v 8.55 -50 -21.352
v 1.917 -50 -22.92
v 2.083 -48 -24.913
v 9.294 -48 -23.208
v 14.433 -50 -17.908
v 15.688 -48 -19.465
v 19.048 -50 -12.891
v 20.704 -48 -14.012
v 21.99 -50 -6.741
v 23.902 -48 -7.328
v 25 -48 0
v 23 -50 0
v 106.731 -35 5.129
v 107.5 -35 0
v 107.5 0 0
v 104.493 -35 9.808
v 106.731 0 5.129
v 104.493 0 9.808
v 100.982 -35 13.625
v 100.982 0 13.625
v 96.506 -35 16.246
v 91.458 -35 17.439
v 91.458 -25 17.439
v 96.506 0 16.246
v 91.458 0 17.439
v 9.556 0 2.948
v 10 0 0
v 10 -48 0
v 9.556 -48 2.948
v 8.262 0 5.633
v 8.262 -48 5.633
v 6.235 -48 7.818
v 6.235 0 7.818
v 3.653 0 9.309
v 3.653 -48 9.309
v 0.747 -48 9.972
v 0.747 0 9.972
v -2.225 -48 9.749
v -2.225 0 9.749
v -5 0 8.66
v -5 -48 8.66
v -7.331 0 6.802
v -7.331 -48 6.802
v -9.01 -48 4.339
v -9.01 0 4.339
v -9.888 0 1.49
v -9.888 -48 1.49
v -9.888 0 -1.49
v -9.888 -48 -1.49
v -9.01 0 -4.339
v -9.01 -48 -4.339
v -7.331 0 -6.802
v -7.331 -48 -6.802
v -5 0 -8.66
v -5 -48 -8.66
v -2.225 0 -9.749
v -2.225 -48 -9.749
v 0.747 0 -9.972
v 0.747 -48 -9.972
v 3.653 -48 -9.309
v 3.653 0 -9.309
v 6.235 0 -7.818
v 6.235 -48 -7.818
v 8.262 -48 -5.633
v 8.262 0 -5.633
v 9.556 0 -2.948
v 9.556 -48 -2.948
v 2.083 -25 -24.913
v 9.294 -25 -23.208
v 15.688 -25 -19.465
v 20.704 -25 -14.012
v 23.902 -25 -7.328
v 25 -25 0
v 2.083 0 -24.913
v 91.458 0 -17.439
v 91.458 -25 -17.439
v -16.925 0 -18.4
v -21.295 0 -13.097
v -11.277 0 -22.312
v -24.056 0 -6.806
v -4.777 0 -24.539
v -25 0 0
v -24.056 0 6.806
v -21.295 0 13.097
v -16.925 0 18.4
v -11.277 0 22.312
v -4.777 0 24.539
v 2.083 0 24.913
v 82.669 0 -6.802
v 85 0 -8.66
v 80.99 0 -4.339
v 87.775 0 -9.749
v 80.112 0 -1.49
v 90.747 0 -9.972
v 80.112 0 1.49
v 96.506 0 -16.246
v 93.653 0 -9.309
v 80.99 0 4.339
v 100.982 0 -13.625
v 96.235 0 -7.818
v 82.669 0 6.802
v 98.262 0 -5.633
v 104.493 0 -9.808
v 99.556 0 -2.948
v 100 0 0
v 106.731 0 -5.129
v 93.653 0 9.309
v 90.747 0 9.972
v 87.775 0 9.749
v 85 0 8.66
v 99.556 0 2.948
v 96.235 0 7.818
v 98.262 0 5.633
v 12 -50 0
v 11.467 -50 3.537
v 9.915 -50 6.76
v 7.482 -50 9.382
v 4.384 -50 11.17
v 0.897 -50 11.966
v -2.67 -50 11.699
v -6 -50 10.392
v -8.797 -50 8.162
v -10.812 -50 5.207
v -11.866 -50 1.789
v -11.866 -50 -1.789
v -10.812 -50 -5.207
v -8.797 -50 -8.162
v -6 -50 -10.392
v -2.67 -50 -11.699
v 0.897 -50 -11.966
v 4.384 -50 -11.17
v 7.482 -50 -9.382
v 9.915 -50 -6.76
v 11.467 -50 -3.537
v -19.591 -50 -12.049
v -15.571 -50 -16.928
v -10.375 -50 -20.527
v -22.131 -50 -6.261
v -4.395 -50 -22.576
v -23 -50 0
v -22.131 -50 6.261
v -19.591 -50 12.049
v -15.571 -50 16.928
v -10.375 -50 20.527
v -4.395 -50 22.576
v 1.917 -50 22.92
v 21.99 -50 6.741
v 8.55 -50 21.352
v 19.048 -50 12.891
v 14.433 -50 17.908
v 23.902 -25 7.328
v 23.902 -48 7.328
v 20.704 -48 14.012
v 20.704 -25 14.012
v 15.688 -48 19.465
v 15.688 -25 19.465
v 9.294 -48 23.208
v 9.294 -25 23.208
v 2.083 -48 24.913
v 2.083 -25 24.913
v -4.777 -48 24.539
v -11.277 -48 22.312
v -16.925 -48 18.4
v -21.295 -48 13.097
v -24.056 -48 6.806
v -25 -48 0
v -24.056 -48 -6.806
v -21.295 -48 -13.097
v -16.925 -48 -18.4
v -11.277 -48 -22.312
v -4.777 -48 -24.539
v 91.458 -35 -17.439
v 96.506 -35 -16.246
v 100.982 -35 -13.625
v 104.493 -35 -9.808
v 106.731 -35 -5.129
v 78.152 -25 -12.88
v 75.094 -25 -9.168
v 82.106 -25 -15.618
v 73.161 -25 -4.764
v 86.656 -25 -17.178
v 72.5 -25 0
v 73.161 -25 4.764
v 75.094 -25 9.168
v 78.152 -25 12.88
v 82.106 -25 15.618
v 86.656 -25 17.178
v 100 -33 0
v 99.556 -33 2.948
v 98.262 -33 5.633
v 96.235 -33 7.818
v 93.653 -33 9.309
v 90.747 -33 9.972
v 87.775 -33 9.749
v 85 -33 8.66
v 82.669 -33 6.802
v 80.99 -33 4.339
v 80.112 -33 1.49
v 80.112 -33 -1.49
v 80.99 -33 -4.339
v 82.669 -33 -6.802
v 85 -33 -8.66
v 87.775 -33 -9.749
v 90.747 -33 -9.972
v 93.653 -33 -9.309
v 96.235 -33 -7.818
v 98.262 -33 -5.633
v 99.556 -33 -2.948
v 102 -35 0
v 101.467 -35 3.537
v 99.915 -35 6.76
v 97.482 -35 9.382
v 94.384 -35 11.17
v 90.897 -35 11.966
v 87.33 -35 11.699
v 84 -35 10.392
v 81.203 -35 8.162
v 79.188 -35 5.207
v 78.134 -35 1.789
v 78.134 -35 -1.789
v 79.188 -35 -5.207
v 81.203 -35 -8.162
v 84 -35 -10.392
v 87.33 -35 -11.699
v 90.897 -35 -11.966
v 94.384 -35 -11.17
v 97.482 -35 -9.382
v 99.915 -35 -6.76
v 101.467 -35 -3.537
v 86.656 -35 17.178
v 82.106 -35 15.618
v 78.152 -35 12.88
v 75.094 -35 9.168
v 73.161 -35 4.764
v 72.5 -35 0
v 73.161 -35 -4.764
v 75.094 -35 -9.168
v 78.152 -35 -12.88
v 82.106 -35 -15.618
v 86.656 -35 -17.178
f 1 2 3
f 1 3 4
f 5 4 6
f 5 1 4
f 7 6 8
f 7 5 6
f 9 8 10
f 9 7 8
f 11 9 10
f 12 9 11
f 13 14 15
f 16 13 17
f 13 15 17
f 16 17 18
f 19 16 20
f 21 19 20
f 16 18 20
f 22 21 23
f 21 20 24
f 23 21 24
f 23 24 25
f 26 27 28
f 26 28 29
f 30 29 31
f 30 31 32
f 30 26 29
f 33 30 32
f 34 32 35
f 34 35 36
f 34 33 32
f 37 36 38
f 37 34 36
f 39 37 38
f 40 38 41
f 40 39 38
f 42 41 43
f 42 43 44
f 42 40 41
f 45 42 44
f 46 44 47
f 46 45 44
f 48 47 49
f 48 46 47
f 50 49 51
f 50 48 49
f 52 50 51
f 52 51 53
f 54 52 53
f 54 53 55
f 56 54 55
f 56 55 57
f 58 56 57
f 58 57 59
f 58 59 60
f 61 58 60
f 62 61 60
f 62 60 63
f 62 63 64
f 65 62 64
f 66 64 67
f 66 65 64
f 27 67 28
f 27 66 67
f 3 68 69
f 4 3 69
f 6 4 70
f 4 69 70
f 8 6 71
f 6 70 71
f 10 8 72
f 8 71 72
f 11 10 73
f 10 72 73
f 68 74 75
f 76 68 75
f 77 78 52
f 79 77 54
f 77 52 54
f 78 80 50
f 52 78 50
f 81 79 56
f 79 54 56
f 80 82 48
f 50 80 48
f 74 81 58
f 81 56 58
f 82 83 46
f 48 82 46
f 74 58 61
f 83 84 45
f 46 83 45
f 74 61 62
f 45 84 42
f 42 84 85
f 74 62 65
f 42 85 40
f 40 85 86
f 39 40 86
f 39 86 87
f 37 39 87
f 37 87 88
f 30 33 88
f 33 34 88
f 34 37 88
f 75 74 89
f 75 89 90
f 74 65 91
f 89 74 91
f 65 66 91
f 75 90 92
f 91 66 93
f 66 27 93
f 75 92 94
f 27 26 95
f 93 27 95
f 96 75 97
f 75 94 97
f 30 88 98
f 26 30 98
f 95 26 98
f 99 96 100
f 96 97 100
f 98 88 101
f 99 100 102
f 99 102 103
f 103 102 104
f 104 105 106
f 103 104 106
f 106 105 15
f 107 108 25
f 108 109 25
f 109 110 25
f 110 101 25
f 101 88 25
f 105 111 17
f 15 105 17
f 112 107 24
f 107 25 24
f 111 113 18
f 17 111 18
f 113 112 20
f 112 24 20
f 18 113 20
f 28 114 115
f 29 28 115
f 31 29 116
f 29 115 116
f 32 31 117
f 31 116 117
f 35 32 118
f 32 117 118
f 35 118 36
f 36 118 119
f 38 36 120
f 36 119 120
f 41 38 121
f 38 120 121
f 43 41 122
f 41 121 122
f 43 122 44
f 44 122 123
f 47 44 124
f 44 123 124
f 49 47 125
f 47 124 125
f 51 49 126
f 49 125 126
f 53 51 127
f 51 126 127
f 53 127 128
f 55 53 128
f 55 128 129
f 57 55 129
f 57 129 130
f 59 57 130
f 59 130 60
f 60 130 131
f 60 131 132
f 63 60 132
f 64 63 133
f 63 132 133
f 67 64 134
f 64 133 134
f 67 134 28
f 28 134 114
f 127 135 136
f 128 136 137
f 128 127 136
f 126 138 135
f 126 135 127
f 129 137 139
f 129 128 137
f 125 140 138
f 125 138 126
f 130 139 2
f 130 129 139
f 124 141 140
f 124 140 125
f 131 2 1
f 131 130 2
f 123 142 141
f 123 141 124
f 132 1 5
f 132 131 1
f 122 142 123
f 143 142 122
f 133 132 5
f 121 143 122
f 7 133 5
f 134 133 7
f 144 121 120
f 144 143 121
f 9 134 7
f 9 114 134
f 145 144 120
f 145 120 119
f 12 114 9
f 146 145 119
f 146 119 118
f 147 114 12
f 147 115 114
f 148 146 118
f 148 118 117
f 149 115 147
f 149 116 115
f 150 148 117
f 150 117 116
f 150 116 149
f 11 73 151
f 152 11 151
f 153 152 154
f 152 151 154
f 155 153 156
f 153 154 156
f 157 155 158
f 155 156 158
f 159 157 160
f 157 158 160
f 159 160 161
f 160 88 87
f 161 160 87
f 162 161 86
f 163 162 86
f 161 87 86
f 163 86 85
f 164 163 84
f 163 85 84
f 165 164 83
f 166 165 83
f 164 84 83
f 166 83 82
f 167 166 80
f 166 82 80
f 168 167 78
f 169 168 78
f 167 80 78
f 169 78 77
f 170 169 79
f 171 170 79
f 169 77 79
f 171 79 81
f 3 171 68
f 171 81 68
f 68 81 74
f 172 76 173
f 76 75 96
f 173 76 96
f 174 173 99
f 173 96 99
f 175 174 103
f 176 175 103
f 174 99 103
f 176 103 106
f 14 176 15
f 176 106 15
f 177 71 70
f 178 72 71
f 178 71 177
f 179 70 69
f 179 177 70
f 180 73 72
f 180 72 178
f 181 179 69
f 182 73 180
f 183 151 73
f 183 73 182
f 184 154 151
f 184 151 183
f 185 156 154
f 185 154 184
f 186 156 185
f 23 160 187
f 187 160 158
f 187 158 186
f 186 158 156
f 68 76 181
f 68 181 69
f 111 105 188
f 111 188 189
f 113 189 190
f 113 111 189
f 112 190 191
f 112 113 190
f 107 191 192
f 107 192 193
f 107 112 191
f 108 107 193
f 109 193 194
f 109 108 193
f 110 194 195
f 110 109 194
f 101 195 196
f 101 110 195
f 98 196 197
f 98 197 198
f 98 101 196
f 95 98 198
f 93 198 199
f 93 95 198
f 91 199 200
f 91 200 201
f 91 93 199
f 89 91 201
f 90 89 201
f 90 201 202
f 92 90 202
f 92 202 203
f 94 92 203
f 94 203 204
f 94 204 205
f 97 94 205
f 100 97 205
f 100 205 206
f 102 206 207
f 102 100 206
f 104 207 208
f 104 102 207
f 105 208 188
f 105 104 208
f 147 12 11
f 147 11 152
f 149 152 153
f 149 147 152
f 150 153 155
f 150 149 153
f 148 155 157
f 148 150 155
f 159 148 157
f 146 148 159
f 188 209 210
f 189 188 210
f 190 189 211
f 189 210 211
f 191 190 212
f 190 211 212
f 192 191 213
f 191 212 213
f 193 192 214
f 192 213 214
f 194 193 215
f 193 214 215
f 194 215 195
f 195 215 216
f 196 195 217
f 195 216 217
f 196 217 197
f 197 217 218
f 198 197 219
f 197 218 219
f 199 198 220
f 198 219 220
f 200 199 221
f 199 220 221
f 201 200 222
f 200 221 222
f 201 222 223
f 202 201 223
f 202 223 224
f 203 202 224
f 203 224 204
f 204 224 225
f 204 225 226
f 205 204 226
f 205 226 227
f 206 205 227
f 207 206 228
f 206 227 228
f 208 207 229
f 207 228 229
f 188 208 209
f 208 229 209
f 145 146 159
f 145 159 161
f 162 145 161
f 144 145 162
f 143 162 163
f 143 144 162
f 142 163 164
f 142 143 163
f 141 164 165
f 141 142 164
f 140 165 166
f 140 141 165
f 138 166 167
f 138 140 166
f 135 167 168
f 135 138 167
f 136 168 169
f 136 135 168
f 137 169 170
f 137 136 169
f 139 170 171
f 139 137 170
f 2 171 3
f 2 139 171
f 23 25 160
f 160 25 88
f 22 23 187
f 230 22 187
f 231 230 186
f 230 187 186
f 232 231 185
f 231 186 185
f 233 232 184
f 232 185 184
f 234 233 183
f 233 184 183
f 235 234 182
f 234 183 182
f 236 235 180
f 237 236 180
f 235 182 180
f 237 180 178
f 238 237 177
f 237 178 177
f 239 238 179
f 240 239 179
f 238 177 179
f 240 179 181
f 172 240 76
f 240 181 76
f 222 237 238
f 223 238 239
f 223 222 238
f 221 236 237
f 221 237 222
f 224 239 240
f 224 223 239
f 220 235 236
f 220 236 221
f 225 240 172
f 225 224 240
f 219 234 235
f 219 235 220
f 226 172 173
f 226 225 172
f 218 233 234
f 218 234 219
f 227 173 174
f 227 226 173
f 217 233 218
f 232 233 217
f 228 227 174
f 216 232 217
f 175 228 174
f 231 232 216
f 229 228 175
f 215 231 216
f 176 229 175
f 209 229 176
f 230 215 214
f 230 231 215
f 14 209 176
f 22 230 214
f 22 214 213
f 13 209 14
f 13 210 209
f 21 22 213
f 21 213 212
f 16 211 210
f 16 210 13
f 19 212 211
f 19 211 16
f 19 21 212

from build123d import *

# Parameters (mm, degrees)
F0_R     = 10
F1_DEPTH = 25
F2_DEPTH = 50
F3_SIZE  = 2
F4_DEPTH = 35
F5_SIZE  = 2


with BuildPart() as f1:
    # F0 (on Front) → F1 (new body)
    with BuildSketch(Plane.XZ):
        with BuildLine():
            ThreePointArc((2.083333, -24.913043), (18.399502, -16.92508), (25, 0))
            ThreePointArc((25, 0), (18.399502, 16.92508), (2.083333, 24.913043))
            ThreePointArc((2.083333, 24.913043), (-25, 0), (2.083333, -24.913043))
        make_face()
        Circle(F0_R, mode=Mode.SUBTRACT)
        with BuildLine():
            ThreePointArc((2.083333, 24.913043), (18.399502, 16.92508), (25, 0))
            ThreePointArc((25, 0), (18.399502, -16.92508), (2.083333, -24.913043))
            Line((2.083333, -24.913043), (91.458333, -17.43913))
            ThreePointArc((91.458333, -17.43913), (72.5, 0), (91.458333, 17.43913))
            Line((91.458333, 17.43913), (2.083333, 24.913043))
        make_face()
        with BuildLine():
            ThreePointArc((107.5, 0), (102.879651, 11.847556), (91.458333, 17.43913))
            ThreePointArc((91.458333, 17.43913), (72.5, 0), (91.458333, -17.43913))
            ThreePointArc((91.458333, -17.43913), (102.879651, -11.847556), (107.5, 0))
        make_face()
        with Locations((90, 0)):
            Circle(F0_R, mode=Mode.SUBTRACT)
    extrude(amount=F1_DEPTH)

    # F0 (on Front) → F2 (join)
    with BuildSketch(Plane.XZ):
        with BuildLine():
            ThreePointArc((2.083333, -24.913043), (18.399502, -16.92508), (25, 0))
            ThreePointArc((25, 0), (18.399502, 16.92508), (2.083333, 24.913043))
            ThreePointArc((2.083333, 24.913043), (-25, 0), (2.083333, -24.913043))
        make_face()
        Circle(F0_R, mode=Mode.SUBTRACT)
    extrude(amount=F2_DEPTH)

    # F3
    f3_edges = [f1.edges().sort_by_distance(p)[0] for p in [
        (-2.083333, -50, 24.913043),
        (-10, -50, 0),
        (80, -25, 0),
    ]]
    chamfer(f3_edges, length=F3_SIZE)

    # F0 (on Front) → F4 (join)
    with BuildSketch(Plane.XZ):
        with BuildLine():
            ThreePointArc((107.5, 0), (102.879651, 11.847556), (91.458333, 17.43913))
            ThreePointArc((91.458333, 17.43913), (72.5, 0), (91.458333, -17.43913))
            ThreePointArc((91.458333, -17.43913), (102.879651, -11.847556), (107.5, 0))
        make_face()
        with Locations((90, 0)):
            Circle(F0_R, mode=Mode.SUBTRACT)
    extrude(amount=F4_DEPTH)

    # F5
    f5_edges = [f1.edges().sort_by_distance(p)[0] for p in [
        (80, -35, 0),
    ]]
    chamfer(f5_edges, length=F5_SIZE)


solid = f1.part
